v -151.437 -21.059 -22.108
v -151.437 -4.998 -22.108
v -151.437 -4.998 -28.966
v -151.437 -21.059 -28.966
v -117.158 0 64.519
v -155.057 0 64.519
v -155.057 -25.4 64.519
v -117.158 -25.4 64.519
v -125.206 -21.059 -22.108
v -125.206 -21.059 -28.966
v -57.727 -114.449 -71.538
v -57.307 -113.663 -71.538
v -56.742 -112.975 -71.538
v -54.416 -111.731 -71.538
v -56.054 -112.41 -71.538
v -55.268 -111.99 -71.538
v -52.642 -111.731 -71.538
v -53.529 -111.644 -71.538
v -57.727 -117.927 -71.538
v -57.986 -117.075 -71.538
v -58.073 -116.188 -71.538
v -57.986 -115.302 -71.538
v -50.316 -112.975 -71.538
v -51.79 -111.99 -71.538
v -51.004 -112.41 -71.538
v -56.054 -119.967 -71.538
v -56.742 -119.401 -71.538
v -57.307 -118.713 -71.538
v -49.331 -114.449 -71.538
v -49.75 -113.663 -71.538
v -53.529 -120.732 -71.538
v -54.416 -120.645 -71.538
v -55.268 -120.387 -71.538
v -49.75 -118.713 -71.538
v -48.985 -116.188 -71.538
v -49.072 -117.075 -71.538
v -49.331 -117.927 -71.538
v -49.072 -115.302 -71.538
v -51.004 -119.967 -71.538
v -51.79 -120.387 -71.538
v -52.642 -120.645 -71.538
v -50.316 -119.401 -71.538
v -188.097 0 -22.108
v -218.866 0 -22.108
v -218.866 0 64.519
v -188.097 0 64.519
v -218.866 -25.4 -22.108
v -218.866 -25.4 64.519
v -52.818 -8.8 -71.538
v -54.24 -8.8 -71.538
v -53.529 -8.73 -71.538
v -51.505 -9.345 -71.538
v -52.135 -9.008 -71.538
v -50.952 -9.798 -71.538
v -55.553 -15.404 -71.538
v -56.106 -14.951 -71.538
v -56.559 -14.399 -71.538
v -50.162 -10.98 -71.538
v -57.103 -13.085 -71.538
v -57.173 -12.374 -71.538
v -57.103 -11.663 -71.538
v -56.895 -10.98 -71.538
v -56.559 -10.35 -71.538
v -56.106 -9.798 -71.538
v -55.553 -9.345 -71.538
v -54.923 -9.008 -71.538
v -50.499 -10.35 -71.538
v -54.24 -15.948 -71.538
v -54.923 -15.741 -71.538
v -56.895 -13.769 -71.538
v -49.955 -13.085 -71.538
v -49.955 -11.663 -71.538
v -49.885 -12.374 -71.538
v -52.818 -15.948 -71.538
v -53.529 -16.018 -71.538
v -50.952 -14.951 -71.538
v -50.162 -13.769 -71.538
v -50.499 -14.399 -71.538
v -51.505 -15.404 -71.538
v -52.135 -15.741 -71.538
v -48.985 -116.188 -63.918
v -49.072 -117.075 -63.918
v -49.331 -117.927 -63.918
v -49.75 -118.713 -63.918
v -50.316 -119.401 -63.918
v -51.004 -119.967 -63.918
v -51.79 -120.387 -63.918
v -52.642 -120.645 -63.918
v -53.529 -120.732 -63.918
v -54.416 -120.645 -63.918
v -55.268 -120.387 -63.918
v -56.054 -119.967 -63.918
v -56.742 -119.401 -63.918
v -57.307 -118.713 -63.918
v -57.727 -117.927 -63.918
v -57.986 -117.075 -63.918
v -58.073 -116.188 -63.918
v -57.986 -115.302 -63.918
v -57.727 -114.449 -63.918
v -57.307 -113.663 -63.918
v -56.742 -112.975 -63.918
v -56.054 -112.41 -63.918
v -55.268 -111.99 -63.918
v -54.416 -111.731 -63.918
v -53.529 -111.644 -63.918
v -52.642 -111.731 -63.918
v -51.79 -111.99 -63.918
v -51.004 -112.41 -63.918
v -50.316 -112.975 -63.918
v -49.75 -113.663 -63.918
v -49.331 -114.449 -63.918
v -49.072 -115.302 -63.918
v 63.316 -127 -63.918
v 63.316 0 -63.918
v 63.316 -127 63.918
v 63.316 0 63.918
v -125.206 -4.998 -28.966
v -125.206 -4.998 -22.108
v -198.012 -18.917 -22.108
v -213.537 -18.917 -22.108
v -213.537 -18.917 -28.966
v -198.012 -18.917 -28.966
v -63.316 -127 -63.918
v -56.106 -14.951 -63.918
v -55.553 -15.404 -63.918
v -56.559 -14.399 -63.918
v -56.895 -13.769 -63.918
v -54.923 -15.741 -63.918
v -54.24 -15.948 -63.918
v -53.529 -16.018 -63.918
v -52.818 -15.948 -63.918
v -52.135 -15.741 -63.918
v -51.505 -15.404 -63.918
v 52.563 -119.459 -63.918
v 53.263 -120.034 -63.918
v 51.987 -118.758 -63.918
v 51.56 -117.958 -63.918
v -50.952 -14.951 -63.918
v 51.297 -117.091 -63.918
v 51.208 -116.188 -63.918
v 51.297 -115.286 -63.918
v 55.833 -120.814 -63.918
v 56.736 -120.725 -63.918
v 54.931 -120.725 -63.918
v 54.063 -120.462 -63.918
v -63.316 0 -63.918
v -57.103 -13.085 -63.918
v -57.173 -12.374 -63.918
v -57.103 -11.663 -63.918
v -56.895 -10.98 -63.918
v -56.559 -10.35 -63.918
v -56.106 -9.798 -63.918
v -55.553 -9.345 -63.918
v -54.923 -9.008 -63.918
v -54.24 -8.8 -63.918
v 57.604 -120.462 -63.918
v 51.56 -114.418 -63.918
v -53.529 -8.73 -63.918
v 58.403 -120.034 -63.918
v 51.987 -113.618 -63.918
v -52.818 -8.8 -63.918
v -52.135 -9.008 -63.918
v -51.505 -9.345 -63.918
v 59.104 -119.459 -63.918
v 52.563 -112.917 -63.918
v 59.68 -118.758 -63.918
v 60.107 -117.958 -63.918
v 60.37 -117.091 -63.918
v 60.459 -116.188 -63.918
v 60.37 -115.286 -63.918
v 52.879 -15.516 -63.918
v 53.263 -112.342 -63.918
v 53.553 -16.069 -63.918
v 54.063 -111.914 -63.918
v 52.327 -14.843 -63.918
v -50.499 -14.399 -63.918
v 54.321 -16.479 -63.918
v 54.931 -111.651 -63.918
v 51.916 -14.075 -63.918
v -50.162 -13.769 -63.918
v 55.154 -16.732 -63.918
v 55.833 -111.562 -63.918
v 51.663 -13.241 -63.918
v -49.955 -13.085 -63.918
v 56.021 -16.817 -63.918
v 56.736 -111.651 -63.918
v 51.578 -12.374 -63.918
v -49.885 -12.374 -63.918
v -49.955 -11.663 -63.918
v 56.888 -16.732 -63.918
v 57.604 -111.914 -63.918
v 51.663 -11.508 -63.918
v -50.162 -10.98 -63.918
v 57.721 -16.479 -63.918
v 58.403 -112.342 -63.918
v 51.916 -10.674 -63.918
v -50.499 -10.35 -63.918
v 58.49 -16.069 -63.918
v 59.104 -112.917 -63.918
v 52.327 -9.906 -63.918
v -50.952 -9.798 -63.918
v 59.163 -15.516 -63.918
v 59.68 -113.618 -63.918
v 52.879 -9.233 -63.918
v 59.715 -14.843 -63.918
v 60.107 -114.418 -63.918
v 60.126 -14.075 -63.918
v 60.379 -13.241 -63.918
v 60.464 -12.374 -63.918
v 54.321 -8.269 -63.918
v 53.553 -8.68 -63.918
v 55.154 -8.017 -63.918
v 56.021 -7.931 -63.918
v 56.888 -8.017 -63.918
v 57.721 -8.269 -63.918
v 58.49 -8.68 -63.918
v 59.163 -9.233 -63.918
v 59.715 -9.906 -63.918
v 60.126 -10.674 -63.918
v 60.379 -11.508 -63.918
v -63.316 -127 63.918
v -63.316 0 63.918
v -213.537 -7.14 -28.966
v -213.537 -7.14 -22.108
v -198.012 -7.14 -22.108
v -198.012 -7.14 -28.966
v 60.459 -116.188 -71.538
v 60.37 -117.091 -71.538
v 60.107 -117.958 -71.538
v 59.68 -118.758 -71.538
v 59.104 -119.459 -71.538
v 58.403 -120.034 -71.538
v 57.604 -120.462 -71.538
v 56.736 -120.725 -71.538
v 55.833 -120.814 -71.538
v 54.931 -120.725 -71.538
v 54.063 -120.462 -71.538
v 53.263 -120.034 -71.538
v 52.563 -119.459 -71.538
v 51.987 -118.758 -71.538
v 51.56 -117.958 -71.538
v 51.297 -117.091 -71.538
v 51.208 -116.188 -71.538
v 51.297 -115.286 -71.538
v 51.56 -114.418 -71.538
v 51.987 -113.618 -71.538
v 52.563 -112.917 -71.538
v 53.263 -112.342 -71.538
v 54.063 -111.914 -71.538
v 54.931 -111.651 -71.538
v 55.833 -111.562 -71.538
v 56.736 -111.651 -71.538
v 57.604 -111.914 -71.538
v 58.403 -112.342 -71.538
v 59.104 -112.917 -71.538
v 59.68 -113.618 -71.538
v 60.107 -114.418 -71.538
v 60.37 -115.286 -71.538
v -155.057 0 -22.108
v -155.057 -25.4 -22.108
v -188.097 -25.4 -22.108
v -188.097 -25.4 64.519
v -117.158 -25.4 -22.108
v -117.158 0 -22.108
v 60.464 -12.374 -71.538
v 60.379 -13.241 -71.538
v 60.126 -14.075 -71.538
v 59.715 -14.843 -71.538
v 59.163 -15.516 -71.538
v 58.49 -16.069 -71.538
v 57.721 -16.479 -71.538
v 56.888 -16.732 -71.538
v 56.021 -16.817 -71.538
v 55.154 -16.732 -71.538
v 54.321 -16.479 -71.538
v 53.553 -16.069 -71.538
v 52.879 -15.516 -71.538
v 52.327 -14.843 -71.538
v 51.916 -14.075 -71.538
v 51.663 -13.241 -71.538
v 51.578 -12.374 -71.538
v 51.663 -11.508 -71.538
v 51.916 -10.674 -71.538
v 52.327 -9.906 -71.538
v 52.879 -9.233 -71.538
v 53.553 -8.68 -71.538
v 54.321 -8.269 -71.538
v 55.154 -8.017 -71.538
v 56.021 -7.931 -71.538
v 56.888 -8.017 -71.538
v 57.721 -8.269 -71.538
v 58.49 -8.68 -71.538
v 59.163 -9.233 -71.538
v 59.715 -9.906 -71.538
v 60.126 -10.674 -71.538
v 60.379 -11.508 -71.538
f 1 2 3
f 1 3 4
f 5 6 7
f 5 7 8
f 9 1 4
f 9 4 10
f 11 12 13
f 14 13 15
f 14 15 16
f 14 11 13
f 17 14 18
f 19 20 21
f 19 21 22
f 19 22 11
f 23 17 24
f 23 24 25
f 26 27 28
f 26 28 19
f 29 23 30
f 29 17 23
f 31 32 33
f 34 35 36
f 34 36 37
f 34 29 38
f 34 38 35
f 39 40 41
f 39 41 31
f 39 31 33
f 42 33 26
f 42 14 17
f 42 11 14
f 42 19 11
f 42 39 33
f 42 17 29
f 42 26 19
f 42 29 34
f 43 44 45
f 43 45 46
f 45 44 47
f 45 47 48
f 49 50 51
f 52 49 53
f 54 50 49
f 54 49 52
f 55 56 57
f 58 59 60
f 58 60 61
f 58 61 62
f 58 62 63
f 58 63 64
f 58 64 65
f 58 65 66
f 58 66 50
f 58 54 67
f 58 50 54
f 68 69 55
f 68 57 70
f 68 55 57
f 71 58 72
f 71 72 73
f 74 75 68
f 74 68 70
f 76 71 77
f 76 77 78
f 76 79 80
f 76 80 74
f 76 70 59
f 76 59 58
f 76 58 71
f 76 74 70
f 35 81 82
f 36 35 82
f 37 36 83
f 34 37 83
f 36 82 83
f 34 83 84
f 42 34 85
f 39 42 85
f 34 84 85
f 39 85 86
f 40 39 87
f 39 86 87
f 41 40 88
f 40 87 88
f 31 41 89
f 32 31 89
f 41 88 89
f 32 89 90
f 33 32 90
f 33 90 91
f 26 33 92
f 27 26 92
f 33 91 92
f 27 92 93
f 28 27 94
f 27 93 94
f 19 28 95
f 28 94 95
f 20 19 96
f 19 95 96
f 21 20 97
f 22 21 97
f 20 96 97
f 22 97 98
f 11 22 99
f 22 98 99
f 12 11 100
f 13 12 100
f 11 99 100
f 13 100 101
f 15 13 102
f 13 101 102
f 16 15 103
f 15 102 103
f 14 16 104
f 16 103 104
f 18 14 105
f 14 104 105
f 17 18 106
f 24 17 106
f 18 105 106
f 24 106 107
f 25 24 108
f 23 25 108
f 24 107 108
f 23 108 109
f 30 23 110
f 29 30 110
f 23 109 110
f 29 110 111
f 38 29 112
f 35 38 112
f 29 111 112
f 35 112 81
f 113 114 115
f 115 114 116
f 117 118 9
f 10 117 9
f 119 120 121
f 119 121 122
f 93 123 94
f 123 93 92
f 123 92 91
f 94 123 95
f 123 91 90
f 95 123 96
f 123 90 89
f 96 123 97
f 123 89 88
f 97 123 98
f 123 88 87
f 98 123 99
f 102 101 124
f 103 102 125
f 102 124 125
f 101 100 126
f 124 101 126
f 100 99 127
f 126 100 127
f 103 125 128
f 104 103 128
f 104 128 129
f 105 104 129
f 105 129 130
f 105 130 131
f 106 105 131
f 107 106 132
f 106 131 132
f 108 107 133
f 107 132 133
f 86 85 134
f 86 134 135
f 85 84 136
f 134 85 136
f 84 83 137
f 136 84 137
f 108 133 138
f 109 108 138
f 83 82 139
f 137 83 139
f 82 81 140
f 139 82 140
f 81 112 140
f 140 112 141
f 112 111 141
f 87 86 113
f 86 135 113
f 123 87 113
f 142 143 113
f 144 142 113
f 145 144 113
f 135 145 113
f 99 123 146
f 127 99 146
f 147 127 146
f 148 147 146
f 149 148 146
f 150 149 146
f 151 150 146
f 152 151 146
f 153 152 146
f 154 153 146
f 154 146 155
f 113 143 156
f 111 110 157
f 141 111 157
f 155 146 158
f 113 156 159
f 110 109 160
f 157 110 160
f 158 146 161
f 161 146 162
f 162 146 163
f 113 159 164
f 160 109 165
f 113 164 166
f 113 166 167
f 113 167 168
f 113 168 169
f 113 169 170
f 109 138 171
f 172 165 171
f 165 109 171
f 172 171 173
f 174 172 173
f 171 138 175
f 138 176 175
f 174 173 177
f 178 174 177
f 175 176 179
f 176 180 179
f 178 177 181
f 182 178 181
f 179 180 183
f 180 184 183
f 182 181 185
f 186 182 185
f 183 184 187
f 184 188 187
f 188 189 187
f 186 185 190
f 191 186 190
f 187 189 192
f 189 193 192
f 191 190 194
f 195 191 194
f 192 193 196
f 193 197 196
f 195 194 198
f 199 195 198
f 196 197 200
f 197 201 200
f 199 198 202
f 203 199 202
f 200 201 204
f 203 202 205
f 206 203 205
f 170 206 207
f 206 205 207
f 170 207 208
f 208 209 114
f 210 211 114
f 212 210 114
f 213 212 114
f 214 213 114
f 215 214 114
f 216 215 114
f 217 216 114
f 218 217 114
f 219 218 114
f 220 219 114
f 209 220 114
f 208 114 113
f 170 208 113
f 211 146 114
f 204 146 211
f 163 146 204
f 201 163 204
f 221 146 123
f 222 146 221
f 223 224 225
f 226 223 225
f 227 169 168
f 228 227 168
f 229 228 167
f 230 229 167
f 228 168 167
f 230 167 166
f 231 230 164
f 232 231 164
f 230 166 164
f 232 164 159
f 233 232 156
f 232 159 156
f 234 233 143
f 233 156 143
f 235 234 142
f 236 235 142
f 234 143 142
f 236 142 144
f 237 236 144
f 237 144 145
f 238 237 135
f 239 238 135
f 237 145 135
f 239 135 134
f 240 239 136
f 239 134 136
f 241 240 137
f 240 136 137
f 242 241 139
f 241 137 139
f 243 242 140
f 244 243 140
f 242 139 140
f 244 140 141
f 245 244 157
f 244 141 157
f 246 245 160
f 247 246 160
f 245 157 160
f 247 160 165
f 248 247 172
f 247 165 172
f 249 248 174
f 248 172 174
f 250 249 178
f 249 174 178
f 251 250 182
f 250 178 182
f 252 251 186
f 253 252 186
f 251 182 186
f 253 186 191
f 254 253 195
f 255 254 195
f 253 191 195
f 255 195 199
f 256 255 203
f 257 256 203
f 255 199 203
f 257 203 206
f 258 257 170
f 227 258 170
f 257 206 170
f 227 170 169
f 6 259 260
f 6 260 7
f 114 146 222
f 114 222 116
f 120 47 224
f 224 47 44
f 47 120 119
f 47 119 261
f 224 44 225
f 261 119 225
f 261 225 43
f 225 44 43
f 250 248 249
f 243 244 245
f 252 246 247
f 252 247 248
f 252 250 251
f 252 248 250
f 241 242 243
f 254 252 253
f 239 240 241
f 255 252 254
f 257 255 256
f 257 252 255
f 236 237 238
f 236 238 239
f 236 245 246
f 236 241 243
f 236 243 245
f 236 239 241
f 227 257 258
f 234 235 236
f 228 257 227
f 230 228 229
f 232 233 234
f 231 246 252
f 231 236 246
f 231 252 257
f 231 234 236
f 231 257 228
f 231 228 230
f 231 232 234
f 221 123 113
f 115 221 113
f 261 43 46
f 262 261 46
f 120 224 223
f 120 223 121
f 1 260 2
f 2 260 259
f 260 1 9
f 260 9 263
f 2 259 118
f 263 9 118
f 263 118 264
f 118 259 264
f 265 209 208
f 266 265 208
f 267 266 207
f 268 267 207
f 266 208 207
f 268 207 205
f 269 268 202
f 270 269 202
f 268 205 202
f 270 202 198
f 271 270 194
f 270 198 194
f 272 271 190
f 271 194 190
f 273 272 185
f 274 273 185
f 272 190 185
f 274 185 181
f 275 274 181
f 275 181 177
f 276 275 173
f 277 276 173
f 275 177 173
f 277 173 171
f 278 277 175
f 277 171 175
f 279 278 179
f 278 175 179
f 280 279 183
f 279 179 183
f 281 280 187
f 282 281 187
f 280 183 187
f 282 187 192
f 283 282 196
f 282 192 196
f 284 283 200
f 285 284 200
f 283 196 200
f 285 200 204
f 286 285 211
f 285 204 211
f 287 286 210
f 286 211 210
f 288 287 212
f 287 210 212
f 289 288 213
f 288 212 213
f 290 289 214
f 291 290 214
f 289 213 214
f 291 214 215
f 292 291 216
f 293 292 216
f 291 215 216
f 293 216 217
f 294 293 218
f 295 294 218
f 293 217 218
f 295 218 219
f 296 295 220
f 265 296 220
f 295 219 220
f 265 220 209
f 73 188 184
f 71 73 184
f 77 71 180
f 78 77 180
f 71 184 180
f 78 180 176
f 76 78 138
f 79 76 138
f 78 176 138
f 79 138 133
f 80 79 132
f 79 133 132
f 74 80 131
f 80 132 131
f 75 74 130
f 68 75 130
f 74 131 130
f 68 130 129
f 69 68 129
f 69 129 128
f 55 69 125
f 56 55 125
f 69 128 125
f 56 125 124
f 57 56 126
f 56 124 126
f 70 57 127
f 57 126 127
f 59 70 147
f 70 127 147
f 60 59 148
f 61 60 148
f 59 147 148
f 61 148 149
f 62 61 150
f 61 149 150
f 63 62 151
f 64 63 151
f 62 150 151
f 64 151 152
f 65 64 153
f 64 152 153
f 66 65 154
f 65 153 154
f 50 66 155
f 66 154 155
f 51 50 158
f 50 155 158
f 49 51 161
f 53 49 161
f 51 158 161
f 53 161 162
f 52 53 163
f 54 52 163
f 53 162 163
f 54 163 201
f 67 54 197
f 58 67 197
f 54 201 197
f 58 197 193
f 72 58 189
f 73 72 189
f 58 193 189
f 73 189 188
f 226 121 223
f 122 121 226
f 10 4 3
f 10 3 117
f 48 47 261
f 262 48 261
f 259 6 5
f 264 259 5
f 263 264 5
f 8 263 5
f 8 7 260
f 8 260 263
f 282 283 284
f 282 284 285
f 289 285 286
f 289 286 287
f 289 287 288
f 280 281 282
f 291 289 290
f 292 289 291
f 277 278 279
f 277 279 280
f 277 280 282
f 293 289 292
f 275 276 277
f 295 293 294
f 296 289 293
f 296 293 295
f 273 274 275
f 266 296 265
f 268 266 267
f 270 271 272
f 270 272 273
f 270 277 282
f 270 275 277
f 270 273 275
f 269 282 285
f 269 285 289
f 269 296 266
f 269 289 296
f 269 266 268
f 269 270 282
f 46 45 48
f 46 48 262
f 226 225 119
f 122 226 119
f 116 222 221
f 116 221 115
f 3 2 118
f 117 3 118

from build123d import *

# Parameters (mm, degrees)
F0_W     = 126.6323775053
F0_H     = 127.8355270624
F1_DEPTH = 25.4
F0_W_2   = 37.8994643688
F0_H_2   = 86.6273678839
F0_W_3   = 30.7692587376
F2_DEPTH = 101.6
F3_W     = 15.5248641968
F3_H     = 11.7775034159
F4_DEPTH = 6.858
F3_W_2   = 26.2317061424
F3_H_2   = 16.0602321848
F5_R     = 4.5443578582
F5_R_2   = 4.6257420085
F5_R_3   = 3.6438747626
F5_R_4   = 4.4430866935
F6_DEPTH = 7.62


with BuildPart() as f1:
    # F0 (on Front) → F1 (new body)
    with BuildSketch(Plane.XZ):
        Rectangle(F0_W, F0_H)
    extrude(amount=F1_DEPTH)

    # F2 (add): a face of the model
    f2_faces = [f1.faces().sort_by_distance(p)[0] for p in [
        (0, -25.4, 0),
    ]]
    extrude(f2_faces, amount=F2_DEPTH)

    # F5 (on face) → F6 (join)
    with BuildSketch(Plane(origin=(0, 0, -63.9177635312), x_dir=(1, 0, 0), z_dir=(0, 0, -1))):
        with Locations((-53.5289533436, 116.1880940199)):
            Circle(F5_R)
        with Locations((55.8334104717, 116.1880940199)):
            Circle(F5_R_2)
        with Locations((-53.5289533436, 12.3743349686)):
            Circle(F5_R_3)
        with Locations((56.0211203992, 12.3743349686)):
            Circle(F5_R_4)
    extrude(amount=F6_DEPTH)


with BuildPart() as f1b:
    # F0 (on Front) → F1, piece 2 (new body)
    with BuildSketch(Plane.XZ):
        with Locations((-136.1072361469, 21.2056580931)):
            Rectangle(F0_W_2, F0_H_2)
    extrude(amount=F1_DEPTH)

    # F3 (on face) → F4, piece 2 (join)
    with BuildSketch(Plane(origin=(0, 0, -22.1080258489), x_dir=(1, 0, 0), z_dir=(0, 0, -1))):
        with Locations((-138.3213549852, 13.0286077037)):
            Rectangle(F3_W_2, F3_H_2)
    extrude(amount=F4_DEPTH)


with BuildPart() as f1c:
    # F0 (on Front) → F1, piece 3 (new body)
    with BuildSketch(Plane.XZ):
        with Locations((-203.4813016653, 21.2056580931)):
            Rectangle(F0_W_3, F0_H_2)
    extrude(amount=F1_DEPTH)

    # F3 (on face) → F4 (join)
    with BuildSketch(Plane(origin=(0, 0, -22.1080258489), x_dir=(1, 0, 0), z_dir=(0, 0, -1))):
        with Locations((-205.7743221521, 13.0286077037)):
            Rectangle(F3_W, F3_H)
    extrude(amount=F4_DEPTH)


solid = Compound([f1.part, f1b.part, f1c.part])
